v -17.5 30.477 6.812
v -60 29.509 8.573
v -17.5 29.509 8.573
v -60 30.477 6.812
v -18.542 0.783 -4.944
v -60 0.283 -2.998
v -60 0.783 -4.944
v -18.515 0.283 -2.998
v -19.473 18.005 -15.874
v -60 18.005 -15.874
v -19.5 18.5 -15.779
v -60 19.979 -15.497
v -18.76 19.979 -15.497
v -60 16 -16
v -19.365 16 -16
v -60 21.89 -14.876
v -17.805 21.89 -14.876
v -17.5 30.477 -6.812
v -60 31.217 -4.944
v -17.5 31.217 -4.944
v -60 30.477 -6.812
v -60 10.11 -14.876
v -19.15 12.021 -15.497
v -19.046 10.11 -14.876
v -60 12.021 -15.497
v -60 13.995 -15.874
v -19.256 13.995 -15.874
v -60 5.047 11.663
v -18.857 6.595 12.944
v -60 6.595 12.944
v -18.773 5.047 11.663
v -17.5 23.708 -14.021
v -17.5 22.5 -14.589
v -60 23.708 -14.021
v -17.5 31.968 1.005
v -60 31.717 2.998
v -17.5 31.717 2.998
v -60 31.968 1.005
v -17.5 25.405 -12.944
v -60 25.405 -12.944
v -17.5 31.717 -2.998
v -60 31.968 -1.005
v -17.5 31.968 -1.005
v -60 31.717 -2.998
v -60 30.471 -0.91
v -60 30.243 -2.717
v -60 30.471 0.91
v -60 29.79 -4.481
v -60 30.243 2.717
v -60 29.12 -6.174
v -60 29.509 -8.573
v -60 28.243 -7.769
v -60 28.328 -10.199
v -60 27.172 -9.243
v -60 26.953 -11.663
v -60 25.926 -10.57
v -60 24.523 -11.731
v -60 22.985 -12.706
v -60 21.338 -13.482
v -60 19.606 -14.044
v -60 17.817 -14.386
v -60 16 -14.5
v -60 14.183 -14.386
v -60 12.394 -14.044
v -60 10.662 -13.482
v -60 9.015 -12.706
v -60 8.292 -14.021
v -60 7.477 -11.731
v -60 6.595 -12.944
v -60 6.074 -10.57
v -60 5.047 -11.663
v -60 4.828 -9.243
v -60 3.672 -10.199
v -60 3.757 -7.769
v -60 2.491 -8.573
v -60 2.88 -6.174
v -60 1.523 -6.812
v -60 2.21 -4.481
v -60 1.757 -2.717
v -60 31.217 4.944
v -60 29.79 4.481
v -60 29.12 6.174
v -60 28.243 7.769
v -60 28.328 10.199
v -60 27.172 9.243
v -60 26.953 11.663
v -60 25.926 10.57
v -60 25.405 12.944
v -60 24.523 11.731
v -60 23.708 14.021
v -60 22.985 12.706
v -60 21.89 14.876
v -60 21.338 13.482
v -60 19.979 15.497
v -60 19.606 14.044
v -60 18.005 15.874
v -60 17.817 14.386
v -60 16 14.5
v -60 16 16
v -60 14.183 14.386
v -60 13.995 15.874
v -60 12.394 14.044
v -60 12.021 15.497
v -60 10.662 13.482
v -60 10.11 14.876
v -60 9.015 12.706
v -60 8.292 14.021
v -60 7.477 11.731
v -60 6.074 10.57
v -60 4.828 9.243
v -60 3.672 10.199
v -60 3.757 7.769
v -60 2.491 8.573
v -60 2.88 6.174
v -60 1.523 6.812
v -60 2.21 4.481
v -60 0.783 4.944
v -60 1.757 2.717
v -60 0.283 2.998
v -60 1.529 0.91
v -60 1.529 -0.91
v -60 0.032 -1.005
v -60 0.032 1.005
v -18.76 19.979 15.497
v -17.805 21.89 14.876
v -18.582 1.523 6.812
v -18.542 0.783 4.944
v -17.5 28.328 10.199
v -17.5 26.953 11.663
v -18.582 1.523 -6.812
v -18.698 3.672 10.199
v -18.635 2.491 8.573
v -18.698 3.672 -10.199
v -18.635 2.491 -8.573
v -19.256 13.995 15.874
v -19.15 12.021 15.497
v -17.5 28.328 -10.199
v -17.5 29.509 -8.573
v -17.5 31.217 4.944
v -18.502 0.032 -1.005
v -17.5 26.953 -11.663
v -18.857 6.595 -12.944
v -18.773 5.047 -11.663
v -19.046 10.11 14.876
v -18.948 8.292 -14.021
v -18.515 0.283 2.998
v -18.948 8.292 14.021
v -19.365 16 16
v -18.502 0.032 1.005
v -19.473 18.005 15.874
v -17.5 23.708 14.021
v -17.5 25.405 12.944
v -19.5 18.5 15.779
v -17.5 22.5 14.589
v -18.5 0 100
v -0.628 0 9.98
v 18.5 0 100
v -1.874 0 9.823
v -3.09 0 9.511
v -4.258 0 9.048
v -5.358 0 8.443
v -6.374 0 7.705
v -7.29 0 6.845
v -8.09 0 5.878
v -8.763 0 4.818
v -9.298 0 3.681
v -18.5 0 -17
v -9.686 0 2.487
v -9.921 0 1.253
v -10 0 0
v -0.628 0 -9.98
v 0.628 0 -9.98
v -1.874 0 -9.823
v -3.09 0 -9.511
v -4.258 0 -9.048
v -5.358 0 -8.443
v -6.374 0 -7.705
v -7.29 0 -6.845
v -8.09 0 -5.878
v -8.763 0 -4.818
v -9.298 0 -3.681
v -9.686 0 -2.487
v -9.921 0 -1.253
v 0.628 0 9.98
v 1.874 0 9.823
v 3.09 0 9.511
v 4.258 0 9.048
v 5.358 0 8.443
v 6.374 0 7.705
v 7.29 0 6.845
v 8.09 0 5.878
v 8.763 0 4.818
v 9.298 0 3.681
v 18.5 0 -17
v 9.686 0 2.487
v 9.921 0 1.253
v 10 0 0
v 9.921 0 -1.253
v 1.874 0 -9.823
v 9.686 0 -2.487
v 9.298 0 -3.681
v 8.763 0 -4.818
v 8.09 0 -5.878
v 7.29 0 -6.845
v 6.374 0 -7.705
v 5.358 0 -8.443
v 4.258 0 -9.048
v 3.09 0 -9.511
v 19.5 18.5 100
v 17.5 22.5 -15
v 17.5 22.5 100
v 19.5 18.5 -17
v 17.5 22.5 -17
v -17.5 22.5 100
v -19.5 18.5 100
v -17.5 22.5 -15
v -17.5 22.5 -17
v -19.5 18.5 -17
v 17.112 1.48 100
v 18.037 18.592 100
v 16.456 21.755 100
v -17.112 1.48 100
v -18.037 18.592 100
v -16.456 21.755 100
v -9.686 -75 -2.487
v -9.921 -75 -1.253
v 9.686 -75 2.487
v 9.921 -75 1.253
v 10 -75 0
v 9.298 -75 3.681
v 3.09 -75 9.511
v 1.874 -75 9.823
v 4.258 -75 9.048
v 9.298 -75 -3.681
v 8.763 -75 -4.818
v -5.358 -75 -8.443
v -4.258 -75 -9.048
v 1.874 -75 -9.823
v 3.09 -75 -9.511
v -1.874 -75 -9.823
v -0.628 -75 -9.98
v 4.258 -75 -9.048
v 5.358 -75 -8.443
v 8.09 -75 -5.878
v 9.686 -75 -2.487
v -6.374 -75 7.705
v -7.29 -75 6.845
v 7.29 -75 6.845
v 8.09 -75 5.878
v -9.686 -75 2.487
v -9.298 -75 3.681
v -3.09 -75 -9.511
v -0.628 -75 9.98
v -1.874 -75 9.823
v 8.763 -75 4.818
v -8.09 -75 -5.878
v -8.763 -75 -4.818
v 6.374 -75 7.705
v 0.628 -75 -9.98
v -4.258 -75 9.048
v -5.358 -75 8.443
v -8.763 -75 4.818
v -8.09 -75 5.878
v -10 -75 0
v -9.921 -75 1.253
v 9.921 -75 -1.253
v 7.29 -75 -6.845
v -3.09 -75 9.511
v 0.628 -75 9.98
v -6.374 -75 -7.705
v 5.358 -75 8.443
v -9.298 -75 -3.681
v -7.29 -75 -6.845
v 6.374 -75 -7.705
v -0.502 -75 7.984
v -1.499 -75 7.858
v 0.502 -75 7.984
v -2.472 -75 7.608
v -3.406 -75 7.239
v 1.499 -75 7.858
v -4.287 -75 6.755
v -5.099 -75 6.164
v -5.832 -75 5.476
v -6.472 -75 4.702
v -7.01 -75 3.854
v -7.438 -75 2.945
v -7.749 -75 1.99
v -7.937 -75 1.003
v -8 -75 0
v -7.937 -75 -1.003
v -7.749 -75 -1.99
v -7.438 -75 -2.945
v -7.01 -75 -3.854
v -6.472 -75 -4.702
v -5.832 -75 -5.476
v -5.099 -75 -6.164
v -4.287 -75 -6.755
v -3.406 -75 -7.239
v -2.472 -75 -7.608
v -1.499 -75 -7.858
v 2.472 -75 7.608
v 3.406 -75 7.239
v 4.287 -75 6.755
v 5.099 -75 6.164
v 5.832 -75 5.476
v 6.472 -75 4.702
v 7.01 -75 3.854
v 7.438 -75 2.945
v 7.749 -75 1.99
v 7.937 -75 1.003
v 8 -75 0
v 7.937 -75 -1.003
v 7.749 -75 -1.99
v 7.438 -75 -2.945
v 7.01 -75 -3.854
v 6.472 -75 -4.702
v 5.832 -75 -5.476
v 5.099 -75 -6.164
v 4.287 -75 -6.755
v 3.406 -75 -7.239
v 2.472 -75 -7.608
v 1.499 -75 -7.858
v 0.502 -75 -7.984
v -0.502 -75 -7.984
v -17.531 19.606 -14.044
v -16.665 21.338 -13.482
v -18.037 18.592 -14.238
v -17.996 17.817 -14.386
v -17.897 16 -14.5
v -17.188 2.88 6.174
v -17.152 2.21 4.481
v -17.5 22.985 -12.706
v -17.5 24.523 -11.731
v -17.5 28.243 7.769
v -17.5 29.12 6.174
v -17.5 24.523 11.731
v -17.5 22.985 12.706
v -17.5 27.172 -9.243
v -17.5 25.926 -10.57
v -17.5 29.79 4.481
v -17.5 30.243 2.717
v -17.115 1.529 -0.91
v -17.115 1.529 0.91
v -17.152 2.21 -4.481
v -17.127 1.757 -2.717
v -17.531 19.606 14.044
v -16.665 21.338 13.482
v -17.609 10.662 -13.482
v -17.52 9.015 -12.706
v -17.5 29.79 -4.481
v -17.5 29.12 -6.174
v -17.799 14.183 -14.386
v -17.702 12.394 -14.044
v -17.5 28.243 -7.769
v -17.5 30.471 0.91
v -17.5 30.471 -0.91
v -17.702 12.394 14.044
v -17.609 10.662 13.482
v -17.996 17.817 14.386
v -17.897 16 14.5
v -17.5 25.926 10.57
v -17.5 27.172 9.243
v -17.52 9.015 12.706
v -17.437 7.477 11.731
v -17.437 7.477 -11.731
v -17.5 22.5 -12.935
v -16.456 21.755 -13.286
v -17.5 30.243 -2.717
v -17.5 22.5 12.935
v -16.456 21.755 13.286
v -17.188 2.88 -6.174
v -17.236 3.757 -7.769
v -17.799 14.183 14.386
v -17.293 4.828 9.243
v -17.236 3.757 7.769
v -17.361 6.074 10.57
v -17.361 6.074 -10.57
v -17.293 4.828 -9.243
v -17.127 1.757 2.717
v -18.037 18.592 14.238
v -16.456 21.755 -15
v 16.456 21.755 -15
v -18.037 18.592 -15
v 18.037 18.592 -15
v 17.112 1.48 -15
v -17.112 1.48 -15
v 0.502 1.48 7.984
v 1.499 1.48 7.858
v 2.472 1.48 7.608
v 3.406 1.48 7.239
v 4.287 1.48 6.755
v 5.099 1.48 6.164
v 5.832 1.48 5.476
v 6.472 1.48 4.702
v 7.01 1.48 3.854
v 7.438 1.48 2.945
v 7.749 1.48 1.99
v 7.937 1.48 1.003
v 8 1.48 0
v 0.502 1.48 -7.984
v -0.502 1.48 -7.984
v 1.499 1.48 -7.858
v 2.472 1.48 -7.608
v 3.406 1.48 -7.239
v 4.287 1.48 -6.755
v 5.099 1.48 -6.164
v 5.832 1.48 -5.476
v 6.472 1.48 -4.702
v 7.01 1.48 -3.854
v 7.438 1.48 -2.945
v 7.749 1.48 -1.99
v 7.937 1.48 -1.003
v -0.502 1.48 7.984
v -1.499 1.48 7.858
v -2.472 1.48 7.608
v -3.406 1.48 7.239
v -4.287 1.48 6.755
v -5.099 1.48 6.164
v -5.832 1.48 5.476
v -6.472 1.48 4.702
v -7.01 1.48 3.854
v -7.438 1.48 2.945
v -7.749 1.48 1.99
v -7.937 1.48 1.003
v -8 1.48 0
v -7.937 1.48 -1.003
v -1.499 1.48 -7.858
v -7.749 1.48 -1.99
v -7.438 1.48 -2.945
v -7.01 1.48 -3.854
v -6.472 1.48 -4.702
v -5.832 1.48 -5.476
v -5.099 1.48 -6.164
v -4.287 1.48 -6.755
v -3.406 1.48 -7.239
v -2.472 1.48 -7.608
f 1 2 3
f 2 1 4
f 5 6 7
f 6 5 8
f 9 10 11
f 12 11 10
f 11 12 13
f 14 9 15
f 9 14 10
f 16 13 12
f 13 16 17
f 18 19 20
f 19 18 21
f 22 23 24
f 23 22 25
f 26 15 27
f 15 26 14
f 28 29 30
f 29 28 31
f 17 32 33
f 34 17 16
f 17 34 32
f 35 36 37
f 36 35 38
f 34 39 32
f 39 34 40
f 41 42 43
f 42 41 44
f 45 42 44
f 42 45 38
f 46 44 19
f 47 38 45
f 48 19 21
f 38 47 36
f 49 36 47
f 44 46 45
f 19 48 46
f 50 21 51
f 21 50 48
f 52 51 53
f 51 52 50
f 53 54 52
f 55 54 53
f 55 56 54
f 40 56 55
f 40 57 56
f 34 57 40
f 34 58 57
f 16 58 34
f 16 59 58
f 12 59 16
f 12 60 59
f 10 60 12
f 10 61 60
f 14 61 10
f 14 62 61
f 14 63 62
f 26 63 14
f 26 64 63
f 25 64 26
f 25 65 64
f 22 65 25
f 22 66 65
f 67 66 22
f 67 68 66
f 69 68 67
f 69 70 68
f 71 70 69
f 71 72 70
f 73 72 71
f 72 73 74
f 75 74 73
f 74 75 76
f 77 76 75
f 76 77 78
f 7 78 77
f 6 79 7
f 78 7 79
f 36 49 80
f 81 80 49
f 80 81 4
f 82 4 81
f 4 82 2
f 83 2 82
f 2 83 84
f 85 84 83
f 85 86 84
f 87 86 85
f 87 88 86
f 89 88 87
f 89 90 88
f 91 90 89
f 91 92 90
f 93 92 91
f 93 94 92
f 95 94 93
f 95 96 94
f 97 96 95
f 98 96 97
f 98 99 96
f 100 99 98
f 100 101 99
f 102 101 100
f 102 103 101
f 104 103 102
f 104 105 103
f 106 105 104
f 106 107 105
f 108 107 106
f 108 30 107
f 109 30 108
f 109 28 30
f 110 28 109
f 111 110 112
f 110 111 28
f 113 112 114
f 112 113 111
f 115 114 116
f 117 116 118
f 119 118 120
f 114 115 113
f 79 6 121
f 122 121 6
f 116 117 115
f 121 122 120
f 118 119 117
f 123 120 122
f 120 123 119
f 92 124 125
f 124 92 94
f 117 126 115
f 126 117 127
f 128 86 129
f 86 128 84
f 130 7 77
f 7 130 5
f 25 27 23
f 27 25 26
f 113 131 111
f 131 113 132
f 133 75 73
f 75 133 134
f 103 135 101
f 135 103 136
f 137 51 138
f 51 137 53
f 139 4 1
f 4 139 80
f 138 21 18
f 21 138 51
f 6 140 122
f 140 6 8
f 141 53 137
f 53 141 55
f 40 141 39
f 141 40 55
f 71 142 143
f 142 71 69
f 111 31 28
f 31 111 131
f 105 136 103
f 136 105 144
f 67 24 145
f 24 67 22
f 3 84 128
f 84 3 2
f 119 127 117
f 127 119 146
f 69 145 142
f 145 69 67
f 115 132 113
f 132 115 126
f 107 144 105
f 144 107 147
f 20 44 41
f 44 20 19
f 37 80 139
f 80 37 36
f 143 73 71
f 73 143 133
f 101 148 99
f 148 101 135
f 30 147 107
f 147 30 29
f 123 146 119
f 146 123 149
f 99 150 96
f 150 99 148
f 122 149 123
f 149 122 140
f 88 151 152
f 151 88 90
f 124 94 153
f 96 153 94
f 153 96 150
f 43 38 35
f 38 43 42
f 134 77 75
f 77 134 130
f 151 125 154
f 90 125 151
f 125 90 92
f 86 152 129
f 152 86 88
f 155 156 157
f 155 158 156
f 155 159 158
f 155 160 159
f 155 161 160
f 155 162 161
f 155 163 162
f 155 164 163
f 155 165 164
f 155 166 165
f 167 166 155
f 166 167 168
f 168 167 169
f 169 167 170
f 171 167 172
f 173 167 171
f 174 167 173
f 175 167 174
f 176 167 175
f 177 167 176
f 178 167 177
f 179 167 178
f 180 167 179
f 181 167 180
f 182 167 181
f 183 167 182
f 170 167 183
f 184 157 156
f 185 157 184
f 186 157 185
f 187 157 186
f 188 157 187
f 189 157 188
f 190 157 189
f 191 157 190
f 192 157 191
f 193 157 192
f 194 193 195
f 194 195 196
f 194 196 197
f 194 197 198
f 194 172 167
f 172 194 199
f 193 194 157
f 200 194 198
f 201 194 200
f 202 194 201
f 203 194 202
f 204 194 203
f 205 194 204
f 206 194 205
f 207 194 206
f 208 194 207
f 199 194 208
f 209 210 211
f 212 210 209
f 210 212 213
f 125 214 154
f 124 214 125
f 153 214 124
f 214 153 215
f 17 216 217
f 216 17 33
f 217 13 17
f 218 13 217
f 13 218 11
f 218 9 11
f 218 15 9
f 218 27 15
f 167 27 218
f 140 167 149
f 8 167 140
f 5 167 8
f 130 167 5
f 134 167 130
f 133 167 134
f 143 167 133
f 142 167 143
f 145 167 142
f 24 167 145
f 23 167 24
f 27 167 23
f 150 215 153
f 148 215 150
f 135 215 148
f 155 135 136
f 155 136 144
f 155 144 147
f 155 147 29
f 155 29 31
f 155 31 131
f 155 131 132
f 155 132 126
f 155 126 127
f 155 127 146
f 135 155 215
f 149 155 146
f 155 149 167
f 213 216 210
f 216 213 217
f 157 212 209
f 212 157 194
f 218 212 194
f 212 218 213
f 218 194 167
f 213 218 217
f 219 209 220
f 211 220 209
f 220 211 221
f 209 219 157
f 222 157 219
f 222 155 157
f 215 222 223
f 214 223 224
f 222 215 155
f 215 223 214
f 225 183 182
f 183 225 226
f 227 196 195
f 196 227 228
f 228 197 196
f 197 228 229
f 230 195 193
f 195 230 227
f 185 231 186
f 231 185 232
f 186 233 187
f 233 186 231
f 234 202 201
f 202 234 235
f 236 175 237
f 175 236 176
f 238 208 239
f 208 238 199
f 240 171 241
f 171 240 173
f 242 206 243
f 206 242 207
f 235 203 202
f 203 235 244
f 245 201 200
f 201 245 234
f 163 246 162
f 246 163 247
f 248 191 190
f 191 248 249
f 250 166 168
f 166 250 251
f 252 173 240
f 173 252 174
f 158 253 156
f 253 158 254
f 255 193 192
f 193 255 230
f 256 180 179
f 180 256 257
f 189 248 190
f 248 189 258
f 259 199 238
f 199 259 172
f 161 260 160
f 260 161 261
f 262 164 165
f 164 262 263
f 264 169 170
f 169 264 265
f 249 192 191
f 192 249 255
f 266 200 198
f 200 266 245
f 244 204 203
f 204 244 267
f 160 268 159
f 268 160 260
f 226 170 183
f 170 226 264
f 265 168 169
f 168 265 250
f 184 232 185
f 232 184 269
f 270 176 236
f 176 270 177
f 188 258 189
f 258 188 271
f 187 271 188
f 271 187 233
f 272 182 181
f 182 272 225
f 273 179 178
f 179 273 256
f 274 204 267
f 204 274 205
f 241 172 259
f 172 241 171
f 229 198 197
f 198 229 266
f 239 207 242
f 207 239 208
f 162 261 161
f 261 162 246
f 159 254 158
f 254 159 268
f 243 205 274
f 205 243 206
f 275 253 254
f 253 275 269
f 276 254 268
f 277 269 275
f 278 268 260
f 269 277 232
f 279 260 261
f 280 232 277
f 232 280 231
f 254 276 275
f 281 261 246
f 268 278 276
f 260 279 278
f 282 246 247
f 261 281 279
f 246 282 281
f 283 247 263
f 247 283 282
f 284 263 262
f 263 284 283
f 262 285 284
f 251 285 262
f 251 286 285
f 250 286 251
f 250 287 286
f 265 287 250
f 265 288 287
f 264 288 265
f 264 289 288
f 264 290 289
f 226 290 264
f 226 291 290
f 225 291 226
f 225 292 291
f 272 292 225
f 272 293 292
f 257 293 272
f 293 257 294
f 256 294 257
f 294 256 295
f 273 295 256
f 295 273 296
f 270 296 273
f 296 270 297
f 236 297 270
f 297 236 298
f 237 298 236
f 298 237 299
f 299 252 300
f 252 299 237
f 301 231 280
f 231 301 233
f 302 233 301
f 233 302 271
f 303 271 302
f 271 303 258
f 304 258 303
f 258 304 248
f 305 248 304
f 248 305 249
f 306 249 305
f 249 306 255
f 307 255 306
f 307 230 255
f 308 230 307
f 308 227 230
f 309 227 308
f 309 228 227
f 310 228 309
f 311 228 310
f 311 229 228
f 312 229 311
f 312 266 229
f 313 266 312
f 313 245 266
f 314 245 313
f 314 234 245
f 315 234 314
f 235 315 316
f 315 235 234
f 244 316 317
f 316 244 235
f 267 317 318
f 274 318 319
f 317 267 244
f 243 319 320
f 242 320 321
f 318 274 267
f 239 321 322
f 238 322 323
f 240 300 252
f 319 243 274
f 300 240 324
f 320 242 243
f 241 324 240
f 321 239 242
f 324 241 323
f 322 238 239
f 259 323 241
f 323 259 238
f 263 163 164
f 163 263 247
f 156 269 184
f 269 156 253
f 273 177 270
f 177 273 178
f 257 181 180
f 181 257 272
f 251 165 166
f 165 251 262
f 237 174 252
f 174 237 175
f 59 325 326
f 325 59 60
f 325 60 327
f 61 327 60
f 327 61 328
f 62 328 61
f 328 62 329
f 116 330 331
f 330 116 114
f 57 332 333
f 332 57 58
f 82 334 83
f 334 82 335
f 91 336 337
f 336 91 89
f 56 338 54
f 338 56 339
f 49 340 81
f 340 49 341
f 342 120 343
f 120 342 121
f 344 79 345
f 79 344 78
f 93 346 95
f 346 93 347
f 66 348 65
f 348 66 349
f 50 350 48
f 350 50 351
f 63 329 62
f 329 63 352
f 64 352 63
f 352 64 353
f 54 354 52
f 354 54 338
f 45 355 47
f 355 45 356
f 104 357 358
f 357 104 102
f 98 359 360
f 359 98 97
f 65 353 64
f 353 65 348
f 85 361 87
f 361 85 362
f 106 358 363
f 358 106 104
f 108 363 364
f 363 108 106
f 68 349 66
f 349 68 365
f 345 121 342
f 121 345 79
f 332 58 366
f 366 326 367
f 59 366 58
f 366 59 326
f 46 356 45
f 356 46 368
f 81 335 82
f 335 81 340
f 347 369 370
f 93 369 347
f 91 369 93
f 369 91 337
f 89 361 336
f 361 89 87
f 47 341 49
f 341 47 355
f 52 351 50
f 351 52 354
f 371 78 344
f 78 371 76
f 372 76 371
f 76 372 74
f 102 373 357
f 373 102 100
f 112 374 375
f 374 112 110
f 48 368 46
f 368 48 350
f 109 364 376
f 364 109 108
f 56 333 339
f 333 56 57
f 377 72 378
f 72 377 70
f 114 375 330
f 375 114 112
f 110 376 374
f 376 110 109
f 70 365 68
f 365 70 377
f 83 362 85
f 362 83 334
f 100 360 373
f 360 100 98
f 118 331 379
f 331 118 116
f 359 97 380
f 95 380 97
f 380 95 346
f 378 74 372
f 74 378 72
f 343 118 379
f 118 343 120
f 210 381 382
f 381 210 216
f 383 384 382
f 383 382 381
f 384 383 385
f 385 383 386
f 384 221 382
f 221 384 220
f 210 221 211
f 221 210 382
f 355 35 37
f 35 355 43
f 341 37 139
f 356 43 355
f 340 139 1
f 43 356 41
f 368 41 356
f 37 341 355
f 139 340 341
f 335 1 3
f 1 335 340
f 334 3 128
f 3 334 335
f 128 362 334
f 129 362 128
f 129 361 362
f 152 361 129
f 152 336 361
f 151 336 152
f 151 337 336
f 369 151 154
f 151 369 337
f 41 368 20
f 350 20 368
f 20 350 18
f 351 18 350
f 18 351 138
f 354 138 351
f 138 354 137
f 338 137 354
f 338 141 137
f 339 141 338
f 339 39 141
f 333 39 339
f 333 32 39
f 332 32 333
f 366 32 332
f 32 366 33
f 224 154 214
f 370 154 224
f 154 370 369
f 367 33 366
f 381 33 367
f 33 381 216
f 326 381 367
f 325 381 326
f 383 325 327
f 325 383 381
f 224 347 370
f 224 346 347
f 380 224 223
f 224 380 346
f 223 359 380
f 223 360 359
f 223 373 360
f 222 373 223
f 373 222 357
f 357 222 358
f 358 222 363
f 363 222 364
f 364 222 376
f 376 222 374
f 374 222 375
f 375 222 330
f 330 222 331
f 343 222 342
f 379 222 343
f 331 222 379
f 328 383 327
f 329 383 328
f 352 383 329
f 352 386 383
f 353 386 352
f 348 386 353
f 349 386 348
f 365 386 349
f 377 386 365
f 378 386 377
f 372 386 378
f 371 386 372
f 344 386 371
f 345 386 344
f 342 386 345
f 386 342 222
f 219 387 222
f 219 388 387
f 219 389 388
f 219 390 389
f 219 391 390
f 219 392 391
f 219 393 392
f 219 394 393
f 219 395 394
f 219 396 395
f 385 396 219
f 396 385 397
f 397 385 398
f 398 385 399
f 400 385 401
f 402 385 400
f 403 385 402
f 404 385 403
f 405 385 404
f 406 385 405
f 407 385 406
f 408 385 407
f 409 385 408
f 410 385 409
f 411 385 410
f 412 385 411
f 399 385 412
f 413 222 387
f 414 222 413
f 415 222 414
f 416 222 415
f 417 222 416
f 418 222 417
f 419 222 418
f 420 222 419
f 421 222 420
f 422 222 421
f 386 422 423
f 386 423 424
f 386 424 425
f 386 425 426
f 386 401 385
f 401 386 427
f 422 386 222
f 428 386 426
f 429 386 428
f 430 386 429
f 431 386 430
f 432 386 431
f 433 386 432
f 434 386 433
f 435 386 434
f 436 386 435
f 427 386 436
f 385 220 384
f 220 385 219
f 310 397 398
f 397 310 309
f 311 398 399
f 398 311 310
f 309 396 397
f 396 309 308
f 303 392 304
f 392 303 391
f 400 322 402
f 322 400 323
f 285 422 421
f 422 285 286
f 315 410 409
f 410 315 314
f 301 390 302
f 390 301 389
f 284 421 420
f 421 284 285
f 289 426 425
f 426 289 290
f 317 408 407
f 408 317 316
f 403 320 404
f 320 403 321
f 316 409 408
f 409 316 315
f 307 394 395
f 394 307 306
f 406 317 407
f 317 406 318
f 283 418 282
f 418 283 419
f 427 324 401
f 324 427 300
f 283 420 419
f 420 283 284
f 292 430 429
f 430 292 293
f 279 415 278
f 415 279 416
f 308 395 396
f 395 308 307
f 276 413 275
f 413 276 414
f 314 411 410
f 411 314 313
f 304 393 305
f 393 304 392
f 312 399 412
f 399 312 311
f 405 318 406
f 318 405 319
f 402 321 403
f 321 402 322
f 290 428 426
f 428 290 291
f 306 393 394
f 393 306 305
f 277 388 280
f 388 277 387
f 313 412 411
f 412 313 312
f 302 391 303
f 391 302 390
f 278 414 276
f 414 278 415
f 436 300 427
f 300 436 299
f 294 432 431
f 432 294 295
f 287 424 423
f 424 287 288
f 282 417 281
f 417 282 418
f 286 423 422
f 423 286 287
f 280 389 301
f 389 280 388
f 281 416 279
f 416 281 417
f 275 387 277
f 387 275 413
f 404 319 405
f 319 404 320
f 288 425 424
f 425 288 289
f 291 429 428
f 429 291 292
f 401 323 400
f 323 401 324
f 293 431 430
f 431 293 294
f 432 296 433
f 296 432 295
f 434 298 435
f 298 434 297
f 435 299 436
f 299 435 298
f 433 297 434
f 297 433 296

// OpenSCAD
$fn=50;

//
// This is a model for a replacement downpipe adaptor for Vitavia greenhouses,
// it can be used to replace a broken original part, or to add downpipes in
// additional corners of the greenhouse. It can also be modified if you
// want to fit a different type of downpipe.
//

// this describes one half of the gutter profile, it is mirrored to make the whole shape
g_profile = [[0,0],[-37/2,0],[-39/2,18.5],[-35/2,22.5],[0,22.5]];

g_gutter_extend_in = 100;
g_gutter_extend_out = 17;
g_gutter_endcap_thickness = 2;

g_downpipe_length = 60;
g_downpipe_outer_diam = 20;
g_downpipe_thickness = 4;
g_downpipe_extend_up = 30;



g_sidepipe_adjust_y = 16;
g_sidepipe_length = 60;
g_sidepipe_outer_diam = 32;
g_sidepipe_thickness = 3;


module gutter_profile_outer()
{
    polygon(g_profile);
    scale([-1,1,1]) polygon(g_profile);
}

module gutter_profile_inner()
{
    // this is a shrunken version of the gutter profile, used
    // to subtract from the full size one to make it hollow, this
    // is a bit nasty, would be better to describe a thickness in mm instead
    // of a scaling factor.
    union() {
        scale([0.925, 0.925,1])
          translate([0, 1.6, 0])
            gutter_profile_outer();
        polygon([[0, 10], g_profile[3], g_profile[3]+[0, 50], [-g_profile[3][0], g_profile[3][1]+50], [-g_profile[3][0], g_profile[3][1]]]);
    }
}

difference() {
    union() {
        
        // Outer gutter
        translate([0, 0, -g_gutter_extend_out])
            linear_extrude(height = g_gutter_extend_in + g_gutter_extend_out)
                gutter_profile_outer();
        
        // Downpipe outer
        translate([0,-g_downpipe_length/2,0]) rotate([90,0,0]) cylinder(d=g_downpipe_outer_diam, h=g_downpipe_length+g_downpipe_extend_up, center=true);
        
        // Sidepipe outer
        translate([-g_sidepipe_length/2,g_sidepipe_adjust_y,0])
            rotate([0,90,0])
            union() {
                translate([0,0,g_sidepipe_length/2])
                   sphere(d=g_sidepipe_outer_diam);
                cylinder(d=g_sidepipe_outer_diam, h=g_sidepipe_length, center=true);
            };
        
        
    }
    
    union() {
         // Inner gutter
         translate([0, 0, -g_gutter_extend_out + g_gutter_endcap_thickness])
            linear_extrude(height = g_gutter_extend_in + g_gutter_extend_out)
                gutter_profile_inner();
        
                // Downpipe inner
        translate([0,-g_downpipe_length/2,0]) rotate([90,0,0]) cylinder(d=g_downpipe_outer_diam-g_downpipe_thickness, h=g_downpipe_length+g_downpipe_extend_up, center=true);
        
        
        // Sidepipe inner
        translate([-g_sidepipe_length/2,g_sidepipe_adjust_y,0]) rotate([0,90,0])
        union(){
            
                translate([0,0,g_sidepipe_length/2])
                   sphere(d=g_sidepipe_outer_diam-g_sidepipe_thickness);
            cylinder(d=g_sidepipe_outer_diam-g_sidepipe_thickness, h=g_sidepipe_length, center=true);
        }
        
    }
}
